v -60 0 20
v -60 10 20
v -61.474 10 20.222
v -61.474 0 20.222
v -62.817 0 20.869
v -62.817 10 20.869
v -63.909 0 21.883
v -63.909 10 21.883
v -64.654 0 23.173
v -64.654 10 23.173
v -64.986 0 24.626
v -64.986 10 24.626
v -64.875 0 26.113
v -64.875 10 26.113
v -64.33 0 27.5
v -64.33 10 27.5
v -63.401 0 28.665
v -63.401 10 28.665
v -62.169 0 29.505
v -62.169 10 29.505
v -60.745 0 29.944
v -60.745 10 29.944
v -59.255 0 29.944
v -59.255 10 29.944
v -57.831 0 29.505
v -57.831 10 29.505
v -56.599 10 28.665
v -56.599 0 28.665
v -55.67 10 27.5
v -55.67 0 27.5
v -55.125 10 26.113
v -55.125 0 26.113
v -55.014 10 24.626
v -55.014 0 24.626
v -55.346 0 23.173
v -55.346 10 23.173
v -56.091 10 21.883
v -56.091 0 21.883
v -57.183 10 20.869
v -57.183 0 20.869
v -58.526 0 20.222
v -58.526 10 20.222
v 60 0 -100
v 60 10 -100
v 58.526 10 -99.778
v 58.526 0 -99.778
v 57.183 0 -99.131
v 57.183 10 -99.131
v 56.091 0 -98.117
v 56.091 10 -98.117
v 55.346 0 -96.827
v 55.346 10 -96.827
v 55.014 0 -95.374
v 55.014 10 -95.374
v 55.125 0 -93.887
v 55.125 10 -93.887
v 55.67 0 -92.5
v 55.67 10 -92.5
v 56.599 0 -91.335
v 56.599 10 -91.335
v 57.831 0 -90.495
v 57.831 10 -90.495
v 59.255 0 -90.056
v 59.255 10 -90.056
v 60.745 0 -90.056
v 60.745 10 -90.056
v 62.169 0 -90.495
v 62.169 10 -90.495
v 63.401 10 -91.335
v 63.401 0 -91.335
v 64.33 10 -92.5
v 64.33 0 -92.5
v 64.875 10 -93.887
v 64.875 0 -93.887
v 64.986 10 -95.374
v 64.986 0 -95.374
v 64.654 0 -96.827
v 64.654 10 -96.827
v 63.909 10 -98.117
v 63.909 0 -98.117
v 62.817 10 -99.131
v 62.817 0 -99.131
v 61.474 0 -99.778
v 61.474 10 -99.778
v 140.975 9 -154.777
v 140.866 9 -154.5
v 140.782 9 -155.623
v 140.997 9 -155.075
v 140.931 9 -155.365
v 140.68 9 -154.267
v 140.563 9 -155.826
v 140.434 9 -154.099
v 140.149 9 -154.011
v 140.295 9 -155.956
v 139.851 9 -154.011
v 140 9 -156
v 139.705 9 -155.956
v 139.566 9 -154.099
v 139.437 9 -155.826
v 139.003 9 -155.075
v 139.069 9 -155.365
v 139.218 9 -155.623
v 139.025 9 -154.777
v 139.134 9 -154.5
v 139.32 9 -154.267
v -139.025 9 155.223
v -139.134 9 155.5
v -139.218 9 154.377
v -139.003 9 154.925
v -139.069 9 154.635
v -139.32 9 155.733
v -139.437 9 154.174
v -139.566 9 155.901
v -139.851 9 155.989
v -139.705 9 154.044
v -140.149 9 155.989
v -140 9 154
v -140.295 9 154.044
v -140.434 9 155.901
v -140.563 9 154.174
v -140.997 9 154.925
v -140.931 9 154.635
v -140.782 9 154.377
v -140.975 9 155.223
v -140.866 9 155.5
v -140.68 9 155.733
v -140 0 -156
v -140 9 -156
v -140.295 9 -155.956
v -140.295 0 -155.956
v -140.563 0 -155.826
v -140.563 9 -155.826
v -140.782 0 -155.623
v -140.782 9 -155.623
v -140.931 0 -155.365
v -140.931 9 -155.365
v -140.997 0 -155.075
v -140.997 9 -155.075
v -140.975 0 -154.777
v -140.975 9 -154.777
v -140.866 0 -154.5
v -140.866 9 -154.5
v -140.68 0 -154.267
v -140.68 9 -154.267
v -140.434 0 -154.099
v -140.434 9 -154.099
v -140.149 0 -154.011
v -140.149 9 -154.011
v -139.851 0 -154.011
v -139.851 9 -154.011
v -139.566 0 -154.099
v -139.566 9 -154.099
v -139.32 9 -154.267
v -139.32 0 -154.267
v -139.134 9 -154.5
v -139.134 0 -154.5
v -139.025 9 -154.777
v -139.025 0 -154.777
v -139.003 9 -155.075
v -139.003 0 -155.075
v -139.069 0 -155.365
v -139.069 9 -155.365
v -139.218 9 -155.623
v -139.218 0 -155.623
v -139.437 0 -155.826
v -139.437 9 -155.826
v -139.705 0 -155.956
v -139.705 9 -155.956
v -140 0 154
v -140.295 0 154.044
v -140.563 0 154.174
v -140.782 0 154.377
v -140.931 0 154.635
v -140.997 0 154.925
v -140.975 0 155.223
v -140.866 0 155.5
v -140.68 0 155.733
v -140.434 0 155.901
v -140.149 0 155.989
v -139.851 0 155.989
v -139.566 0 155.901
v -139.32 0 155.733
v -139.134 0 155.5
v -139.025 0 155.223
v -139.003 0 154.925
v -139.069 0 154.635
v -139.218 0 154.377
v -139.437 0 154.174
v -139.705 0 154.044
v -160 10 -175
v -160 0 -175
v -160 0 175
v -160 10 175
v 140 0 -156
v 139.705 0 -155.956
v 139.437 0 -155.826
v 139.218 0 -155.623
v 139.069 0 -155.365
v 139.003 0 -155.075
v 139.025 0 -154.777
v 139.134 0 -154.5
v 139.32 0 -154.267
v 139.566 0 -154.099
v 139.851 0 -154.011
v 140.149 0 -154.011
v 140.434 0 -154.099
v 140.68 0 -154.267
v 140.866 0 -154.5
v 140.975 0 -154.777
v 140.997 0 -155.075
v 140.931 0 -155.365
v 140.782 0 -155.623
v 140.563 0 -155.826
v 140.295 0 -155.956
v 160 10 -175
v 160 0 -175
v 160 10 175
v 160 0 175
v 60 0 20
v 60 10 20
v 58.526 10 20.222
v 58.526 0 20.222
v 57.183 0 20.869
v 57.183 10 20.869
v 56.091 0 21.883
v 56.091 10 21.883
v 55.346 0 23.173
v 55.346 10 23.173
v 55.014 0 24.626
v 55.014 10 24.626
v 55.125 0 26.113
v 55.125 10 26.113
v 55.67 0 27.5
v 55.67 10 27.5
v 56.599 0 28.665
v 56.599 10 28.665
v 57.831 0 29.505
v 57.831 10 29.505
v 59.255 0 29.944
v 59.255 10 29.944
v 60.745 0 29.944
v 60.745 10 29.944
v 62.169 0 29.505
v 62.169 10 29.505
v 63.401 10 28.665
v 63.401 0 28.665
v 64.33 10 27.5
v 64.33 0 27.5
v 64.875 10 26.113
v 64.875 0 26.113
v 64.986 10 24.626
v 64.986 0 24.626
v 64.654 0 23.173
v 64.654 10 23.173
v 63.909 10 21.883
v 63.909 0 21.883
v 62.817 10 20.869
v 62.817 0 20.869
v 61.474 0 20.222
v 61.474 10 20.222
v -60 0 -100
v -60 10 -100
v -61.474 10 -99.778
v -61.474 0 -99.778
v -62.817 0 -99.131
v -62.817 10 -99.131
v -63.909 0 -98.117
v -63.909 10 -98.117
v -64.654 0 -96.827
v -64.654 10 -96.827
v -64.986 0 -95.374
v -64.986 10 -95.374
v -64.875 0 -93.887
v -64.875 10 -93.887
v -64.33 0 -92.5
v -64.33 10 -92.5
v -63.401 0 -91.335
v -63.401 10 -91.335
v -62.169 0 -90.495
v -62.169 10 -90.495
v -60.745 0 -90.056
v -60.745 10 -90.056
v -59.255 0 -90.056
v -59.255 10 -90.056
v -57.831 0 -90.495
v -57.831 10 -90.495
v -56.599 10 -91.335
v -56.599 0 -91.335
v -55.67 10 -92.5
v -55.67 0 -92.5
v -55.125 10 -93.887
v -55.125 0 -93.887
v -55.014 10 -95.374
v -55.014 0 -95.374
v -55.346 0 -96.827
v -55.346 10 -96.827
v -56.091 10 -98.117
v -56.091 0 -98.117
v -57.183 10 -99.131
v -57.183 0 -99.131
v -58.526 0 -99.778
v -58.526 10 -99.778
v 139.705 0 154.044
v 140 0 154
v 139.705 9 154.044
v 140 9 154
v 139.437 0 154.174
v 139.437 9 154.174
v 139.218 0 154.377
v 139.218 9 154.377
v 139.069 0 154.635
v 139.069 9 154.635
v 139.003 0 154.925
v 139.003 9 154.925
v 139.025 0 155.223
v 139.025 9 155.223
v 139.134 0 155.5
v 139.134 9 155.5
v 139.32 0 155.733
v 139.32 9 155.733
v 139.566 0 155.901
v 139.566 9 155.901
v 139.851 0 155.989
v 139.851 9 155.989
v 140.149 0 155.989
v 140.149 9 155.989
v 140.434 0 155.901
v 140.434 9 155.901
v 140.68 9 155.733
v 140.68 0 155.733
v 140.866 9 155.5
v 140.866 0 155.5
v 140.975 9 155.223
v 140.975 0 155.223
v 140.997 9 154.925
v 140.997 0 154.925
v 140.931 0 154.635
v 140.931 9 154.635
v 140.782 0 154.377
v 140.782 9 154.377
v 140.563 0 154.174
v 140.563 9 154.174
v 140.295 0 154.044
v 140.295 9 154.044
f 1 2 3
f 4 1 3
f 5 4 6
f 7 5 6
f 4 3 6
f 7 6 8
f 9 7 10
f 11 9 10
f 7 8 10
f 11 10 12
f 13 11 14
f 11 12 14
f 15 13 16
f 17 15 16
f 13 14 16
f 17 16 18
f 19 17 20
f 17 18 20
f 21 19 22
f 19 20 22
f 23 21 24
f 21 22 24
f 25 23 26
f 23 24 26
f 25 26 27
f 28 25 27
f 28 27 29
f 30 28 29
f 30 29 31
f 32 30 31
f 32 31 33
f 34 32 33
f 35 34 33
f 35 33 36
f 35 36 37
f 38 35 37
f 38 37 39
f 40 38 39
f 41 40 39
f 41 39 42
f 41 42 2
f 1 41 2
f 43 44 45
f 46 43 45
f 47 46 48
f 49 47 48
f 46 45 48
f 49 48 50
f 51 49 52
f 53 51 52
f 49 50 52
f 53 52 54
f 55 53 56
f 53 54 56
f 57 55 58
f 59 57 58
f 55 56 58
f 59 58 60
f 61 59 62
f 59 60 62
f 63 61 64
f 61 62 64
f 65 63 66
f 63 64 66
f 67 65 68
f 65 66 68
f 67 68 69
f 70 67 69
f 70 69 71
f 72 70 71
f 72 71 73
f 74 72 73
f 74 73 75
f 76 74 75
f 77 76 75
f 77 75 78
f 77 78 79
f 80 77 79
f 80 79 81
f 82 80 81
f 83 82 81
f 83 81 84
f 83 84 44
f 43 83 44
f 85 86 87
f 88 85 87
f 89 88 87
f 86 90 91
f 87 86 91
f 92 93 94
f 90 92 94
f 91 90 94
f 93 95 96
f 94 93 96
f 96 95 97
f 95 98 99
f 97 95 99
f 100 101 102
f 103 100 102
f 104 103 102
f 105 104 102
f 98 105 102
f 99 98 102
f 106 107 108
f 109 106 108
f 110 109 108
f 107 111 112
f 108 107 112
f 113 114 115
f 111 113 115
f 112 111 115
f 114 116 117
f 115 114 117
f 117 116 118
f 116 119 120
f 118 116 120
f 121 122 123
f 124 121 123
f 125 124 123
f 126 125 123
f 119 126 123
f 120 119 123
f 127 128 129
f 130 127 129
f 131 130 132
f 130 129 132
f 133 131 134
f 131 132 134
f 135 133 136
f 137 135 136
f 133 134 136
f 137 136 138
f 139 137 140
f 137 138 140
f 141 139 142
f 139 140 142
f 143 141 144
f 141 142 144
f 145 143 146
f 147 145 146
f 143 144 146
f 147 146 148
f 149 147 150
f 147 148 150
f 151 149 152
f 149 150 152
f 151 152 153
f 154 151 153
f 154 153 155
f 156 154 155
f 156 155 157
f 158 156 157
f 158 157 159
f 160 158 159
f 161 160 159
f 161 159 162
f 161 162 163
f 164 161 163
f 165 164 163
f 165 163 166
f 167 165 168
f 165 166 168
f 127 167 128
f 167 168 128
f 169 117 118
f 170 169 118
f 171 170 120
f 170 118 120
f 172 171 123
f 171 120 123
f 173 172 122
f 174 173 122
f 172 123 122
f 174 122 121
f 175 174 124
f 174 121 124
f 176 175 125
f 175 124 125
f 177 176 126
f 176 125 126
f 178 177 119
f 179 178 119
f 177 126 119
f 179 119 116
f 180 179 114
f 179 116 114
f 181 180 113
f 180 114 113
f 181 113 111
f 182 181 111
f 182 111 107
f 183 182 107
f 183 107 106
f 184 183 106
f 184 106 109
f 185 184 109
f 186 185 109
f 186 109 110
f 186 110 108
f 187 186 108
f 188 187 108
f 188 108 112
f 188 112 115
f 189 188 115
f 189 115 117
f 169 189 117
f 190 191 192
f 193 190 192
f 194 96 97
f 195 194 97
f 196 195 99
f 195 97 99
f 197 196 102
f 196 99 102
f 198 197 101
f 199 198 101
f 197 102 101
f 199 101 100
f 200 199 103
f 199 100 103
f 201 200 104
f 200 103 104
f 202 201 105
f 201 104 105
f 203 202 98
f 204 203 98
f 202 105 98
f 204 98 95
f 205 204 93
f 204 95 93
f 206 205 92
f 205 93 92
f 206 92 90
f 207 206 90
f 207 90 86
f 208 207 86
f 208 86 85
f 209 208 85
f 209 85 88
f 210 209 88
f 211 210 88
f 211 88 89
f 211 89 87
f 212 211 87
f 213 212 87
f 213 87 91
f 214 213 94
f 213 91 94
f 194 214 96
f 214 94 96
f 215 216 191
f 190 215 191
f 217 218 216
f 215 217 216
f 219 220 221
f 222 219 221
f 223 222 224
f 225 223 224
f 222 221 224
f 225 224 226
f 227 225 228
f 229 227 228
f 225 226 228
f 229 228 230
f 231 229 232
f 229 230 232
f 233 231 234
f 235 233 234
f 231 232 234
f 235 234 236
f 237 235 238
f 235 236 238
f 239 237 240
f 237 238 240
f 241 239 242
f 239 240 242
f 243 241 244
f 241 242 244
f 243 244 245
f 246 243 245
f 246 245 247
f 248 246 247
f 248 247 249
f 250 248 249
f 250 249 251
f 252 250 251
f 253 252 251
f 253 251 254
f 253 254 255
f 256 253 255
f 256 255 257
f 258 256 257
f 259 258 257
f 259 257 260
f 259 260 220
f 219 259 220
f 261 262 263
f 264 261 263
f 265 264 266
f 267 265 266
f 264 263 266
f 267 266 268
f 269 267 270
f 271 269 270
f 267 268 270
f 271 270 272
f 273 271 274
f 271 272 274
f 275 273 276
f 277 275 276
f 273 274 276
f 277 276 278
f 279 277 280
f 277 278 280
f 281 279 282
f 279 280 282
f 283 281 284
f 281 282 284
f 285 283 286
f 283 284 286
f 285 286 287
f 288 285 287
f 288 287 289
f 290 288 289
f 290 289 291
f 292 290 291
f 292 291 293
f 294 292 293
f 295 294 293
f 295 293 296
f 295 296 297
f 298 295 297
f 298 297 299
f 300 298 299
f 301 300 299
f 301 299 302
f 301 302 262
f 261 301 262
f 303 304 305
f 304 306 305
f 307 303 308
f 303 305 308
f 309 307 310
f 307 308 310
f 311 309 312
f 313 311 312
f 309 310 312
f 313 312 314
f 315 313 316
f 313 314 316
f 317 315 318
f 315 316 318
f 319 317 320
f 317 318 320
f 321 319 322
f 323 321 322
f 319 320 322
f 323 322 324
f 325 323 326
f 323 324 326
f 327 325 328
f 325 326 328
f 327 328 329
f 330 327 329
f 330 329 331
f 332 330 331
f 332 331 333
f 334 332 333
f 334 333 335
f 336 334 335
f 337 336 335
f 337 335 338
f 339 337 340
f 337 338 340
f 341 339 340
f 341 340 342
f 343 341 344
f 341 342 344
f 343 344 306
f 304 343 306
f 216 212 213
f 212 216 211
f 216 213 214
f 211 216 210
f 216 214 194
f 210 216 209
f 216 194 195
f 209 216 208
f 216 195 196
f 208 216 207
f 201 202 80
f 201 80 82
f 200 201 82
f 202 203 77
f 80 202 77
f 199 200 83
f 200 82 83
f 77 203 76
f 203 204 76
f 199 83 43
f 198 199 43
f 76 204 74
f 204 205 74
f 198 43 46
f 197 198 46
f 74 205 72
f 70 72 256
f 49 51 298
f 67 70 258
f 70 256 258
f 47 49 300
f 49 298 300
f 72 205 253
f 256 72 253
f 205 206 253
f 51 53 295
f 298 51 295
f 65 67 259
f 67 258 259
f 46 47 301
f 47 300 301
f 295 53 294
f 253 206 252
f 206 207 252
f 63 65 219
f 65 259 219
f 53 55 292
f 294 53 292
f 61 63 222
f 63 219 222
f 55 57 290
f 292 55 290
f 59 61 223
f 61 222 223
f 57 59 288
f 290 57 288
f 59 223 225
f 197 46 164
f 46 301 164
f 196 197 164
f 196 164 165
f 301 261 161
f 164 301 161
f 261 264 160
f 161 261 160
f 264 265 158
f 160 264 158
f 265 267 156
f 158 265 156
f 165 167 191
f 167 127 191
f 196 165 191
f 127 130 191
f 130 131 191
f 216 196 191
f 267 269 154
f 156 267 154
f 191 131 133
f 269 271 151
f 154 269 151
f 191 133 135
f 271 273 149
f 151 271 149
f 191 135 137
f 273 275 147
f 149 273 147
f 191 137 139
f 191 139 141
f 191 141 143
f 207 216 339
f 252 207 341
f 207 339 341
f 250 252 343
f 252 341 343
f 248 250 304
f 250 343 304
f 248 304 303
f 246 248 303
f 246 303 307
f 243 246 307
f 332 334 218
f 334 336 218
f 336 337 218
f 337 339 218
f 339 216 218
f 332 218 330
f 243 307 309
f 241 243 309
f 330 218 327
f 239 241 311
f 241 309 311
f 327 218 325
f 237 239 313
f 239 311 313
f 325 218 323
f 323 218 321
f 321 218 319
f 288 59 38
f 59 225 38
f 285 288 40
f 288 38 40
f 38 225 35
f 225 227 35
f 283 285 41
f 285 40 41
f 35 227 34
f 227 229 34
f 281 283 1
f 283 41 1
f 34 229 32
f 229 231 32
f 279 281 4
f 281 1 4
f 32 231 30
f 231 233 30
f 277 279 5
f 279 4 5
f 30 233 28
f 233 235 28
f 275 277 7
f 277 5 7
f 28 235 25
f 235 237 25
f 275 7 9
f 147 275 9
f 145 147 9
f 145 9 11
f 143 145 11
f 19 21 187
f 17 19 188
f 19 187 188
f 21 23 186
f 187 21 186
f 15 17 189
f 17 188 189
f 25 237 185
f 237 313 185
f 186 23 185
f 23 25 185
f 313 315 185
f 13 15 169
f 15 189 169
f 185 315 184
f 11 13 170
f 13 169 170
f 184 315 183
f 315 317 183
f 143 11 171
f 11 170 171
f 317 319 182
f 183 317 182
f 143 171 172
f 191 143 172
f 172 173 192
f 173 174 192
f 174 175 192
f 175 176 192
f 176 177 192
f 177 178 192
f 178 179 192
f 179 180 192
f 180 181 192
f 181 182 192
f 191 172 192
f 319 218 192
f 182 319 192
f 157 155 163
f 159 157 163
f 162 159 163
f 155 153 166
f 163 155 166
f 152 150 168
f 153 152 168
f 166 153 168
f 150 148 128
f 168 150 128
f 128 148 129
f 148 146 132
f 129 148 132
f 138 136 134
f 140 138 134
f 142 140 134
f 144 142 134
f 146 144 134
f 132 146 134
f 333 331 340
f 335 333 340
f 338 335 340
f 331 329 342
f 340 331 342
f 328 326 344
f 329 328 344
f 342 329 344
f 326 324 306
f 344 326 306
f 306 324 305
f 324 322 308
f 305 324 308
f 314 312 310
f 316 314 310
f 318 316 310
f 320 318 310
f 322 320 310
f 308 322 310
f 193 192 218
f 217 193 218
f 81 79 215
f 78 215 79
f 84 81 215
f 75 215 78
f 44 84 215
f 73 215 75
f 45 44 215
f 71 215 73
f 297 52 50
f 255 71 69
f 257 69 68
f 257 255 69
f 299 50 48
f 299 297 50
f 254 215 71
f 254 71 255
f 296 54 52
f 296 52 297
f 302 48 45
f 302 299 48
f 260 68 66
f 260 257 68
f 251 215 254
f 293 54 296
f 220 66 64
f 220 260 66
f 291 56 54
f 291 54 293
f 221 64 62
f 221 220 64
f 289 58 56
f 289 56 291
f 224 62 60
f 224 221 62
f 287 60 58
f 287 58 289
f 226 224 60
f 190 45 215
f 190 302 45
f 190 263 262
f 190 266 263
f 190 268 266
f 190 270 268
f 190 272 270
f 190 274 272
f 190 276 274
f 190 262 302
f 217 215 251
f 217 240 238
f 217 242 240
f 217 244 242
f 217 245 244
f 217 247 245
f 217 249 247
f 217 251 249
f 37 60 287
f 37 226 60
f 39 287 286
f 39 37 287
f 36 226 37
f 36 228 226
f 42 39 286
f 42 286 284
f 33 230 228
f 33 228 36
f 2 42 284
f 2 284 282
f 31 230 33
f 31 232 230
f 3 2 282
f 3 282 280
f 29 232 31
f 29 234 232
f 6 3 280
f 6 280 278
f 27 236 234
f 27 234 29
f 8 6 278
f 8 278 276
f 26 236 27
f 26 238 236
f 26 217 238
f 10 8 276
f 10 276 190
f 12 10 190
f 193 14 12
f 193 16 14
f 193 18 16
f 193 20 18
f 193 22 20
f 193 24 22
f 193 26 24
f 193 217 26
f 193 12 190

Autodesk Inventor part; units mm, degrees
ref_plane "YZ Plane" through (0, 0, 0) normal (1, 0, 0) x (0, 1, 0)
ref_plane "XZ Plane" through (0, 0, 0) normal (0, 1, 0) x (-1, 0, 0)
ref_plane "XY Plane" through (0, 0, 0) normal (0, 0, 1) x (1, 0, 0)
sketch "Náčrt1" plane through (0, 0, 0) normal (0, 1, 0) x (-1, 0, 0)
  line L0 (160, 175) -> (-160, 175)
  line L1 (-160, 175) -> (-160, -175)
  line L2 (-160, -175) -> (160, -175)
  line L3 (160, -175) -> (160, 175)
  line L4 (160, 175) -> (-160, -175) construction
  line L5 (-160, 175) -> (160, -175) construction
  point P0 (0, 0)
  dimension "d0" = 320
  dimension "d1" = 350
extrude "Vysunutí1" add sketch "Náčrt1" along normal blind 10
sketch "Náčrt3" plane through (0, 0, 0) normal (0, -1, 0) x (1, 0, 0)
  line L0 (160, -175) -> (-160, -175) projected
  line L1 (160, 175) -> (160, -175) projected
  point P0 (0, 0)
  point P1 (60, -95)
  point P2 (60, 25)
  point P3 (-60, 25)
  point P4 (-60, -95)
  dimension "d14" = 120
  dimension "d15" = 120
  dimension "d16" = 80
  dimension "d17" = 100
hole "Díra1" at (60, 0, -95) at (60, 0, 25) at (-60, 0, 25) at (-60, 0, -95) direction (0, 1, 0) diameter 10 end through all
sketch "Náčrt4" plane through (0, 0, 0) normal (0, -1, 0) x (1, 0, 0)
  line L0 (-160, 175) -> (160, 175) projected
  line L1 (-160, -175) -> (-160, 175) projected
  line L2 (160, 175) -> (160, -175) projected
  line L3 (160, -175) -> (-160, -175) projected
  point P0 (0, 0)
  point P1 (-140, 155)
  point P2 (140, 155)
  point P3 (-140, -155)
  point P4 (140, -155)
  dimension "d25" = 20
  dimension "d26" = 20
  dimension "d27" = 20
  dimension "d28" = 20
hole "Díra2" at (-140, 0, 155) at (140, 0, 155) at (-140, 0, -155) at (140, 0, -155) direction (0, 1, 0) diameter 2 depth 9
properties part number "deska" material "Dřevo (Bříza)"
